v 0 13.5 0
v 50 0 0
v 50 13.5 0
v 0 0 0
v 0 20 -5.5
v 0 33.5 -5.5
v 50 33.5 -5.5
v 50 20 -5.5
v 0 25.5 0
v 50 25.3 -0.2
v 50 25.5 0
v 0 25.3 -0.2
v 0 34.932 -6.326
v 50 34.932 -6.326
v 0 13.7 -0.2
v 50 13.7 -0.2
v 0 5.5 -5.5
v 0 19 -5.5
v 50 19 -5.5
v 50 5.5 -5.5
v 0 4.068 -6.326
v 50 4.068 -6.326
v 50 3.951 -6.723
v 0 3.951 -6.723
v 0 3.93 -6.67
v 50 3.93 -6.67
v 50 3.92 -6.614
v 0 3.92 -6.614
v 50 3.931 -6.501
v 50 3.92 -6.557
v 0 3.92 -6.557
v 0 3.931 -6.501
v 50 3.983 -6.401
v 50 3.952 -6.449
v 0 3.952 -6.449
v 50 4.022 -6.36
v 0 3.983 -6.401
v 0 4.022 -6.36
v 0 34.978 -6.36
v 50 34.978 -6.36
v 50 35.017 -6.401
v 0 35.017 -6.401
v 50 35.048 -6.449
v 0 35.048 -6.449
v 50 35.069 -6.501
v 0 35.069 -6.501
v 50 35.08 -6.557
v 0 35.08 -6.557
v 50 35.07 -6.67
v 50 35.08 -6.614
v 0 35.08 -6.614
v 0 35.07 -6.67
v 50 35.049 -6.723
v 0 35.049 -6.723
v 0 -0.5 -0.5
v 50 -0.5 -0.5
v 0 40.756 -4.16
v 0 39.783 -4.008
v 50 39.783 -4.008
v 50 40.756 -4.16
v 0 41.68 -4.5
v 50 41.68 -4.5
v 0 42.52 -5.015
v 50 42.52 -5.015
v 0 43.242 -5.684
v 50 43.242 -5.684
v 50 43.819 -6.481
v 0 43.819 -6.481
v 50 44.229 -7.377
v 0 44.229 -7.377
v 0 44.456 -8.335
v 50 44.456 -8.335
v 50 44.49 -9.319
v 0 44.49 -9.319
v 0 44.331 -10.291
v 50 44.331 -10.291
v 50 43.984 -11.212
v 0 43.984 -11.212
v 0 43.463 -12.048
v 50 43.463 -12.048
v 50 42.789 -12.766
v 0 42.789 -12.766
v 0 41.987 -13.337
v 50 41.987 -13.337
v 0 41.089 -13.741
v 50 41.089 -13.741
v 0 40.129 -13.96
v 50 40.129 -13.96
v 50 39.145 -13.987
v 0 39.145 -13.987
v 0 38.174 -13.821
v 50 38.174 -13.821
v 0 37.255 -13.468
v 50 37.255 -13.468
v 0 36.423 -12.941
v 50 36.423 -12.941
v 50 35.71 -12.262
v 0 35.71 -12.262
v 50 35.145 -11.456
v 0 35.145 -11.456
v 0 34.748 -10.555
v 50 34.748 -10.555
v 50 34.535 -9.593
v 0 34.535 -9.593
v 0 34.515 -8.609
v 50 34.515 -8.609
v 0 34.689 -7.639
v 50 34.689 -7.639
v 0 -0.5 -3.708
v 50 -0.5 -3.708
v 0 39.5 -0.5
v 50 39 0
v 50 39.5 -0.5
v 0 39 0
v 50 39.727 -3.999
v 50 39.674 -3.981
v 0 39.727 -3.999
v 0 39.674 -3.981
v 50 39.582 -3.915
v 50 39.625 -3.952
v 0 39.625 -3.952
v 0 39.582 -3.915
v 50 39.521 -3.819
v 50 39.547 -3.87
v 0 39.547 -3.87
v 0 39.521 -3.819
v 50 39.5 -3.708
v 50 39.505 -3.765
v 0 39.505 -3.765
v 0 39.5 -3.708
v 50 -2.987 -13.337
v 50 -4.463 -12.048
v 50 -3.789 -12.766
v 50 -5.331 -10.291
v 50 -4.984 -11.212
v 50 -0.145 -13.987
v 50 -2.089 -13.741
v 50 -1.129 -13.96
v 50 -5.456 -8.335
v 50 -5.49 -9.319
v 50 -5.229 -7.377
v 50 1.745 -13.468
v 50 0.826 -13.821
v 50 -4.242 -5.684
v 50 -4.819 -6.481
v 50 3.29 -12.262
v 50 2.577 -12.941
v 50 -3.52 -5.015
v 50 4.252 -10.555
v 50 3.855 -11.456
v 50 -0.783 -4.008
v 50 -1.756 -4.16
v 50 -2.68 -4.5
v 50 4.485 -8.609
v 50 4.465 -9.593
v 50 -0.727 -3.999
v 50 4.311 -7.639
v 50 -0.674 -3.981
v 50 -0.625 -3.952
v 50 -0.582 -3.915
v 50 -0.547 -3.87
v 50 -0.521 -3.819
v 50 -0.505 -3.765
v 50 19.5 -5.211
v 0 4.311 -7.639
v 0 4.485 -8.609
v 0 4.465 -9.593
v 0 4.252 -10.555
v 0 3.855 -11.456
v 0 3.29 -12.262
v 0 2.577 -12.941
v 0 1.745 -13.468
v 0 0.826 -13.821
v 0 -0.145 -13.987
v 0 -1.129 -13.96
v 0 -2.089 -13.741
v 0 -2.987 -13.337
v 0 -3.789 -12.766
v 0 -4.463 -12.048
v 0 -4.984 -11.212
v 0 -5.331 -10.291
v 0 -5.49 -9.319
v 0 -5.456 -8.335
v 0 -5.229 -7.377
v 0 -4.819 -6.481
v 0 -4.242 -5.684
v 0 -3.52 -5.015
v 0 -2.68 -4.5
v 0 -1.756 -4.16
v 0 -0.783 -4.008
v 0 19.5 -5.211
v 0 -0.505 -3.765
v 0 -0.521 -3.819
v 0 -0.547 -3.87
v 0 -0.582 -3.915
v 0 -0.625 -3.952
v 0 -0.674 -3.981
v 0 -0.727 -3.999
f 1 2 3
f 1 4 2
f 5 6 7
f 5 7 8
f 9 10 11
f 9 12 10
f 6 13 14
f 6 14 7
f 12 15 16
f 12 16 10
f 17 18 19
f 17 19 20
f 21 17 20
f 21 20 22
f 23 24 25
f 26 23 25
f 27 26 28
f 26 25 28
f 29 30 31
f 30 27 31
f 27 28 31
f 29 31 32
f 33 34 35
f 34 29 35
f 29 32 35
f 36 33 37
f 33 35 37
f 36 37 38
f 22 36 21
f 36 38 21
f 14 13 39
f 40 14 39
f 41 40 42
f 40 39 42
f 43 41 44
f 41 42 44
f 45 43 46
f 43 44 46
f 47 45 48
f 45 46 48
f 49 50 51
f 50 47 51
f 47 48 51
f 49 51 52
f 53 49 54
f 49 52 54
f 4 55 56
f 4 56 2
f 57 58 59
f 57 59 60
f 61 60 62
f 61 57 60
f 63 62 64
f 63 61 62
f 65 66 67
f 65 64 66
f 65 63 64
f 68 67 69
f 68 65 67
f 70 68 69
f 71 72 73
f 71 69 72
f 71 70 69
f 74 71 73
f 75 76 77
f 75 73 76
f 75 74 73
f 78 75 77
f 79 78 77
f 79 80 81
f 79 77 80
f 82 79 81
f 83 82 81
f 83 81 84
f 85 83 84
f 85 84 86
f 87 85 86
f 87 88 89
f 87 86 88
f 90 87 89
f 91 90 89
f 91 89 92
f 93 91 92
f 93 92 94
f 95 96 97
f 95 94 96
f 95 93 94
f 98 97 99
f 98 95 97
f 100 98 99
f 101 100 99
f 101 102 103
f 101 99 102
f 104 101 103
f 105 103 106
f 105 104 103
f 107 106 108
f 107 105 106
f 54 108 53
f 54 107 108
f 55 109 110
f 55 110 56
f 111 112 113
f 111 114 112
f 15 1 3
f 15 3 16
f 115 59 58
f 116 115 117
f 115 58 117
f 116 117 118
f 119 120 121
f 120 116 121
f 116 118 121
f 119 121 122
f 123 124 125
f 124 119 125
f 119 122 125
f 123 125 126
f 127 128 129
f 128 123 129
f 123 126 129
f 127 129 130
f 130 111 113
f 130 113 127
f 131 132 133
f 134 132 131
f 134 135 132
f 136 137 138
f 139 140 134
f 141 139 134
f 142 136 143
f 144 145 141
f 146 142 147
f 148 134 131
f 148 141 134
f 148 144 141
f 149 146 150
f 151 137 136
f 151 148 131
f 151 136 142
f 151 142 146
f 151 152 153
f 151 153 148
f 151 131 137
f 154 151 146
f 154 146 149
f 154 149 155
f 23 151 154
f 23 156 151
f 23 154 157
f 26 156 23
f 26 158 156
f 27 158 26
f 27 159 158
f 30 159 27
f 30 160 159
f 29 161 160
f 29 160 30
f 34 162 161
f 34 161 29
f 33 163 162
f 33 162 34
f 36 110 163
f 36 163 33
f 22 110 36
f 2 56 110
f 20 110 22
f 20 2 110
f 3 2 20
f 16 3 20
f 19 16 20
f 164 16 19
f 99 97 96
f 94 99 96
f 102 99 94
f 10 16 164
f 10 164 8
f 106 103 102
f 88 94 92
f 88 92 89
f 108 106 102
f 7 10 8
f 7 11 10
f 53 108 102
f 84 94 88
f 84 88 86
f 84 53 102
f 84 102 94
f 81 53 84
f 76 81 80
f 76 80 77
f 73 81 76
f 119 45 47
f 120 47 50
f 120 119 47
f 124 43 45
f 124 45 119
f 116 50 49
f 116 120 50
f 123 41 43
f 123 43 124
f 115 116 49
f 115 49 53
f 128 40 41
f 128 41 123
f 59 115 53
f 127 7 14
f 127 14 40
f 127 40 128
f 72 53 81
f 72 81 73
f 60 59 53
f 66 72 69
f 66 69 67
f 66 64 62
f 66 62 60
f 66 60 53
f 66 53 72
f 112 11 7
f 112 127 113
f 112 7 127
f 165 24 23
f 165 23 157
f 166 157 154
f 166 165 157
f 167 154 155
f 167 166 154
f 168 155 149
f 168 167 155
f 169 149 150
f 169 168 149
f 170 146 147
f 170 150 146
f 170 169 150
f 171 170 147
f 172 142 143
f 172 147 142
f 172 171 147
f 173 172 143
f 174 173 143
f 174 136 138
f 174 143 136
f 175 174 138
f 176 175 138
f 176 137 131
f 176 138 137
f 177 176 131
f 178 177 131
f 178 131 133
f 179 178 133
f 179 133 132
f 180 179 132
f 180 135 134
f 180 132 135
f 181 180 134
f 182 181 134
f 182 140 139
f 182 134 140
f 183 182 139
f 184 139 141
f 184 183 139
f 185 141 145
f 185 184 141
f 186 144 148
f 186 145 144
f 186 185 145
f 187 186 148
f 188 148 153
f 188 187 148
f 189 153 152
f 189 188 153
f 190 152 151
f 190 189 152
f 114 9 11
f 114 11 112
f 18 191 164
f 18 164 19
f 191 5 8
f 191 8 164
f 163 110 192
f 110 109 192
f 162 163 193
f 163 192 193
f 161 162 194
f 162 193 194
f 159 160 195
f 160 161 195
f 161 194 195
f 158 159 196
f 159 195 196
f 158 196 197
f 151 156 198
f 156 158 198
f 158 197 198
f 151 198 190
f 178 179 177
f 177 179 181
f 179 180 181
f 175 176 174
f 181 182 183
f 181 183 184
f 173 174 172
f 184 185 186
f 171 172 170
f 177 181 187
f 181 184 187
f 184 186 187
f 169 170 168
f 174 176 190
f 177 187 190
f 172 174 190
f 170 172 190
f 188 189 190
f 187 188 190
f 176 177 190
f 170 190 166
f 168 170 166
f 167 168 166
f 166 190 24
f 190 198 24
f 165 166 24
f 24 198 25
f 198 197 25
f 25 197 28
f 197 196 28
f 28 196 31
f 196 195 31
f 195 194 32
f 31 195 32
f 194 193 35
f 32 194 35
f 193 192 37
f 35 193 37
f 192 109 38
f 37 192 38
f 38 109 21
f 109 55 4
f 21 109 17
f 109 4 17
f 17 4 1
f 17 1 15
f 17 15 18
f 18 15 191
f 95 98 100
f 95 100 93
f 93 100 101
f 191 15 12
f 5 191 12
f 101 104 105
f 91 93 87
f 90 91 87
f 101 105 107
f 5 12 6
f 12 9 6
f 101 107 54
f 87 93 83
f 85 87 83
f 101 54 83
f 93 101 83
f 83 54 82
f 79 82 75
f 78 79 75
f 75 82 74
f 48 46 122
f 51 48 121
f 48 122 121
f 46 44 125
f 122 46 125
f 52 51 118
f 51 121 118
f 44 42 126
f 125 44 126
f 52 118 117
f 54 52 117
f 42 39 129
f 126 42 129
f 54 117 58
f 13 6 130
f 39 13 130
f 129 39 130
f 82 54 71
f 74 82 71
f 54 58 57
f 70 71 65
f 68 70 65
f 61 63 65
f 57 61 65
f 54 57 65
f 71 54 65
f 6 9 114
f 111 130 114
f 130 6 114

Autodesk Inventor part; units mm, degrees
ref_plane "YZ Plane" through (0, 0, 0) normal (1, 0, 0) x (0, 1, 0)
ref_plane "XZ Plane" through (0, 0, 0) normal (0, 1, 0) x (-1, 0, 0)
ref_plane "XY Plane" through (0, 0, 0) normal (0, 0, 1) x (1, 0, 0)
sketch "Szkic1" plane through (0, 0, 0) normal (1, 0, 0) x (0, 1, 0)
  line L0 (13.7, -0.2) -> (25.3, -0.2)
  line L1 (13.5, 0) -> (13.7, -0.2)
  line L2 (0, 0) -> (13.5, 0)
  line L3 (-0.5, -0.5) -> (0, 0)
  line L4 (-0.5, -3.7085) -> (-0.5, -0.5)
  arc A0 (-0.783, -4.008) -> (-0.5, -3.7085) centre (-0.8, -3.7085) ccw
  arc A1 (-0.783, -4.008) -> (3.9514, -6.7229) centre (-0.5, -9) ccw
  arc A2 (4.0685, -6.3265) -> (3.9514, -6.7229) centre (4.2185, -6.5863) ccw
  line L5 (5.5, -5.5) -> (4.0685, -6.3265)
  line L6 (19, -5.5) -> (5.5, -5.5)
  line L7 (19.5, -5.2113) -> (19, -5.5)
  line L8 (20, -5.5) -> (19.5, -5.2113)
  line L9 (33.5, -5.5) -> (20, -5.5)
  line L10 (34.9315, -6.3265) -> (33.5, -5.5)
  arc A3 (35.0486, -6.7229) -> (34.9315, -6.3265) centre (34.7815, -6.5863) ccw
  arc A4 (35.0486, -6.7229) -> (39.783, -4.008) centre (39.5, -9) ccw
  arc A5 (39.5, -3.7085) -> (39.783, -4.008) centre (39.8, -3.7085) ccw
  line L11 (39.5, -0.5) -> (39.5, -3.7085)
  line L12 (39, 0) -> (39.5, -0.5)
  line L13 (25.5, 0) -> (39, 0)
  line L14 (25.3, -0.2) -> (25.5, 0)
  point P0 (19.5, 0)
extrude "Wyciągnięcie proste1" add sketch "Szkic1" along normal blind 50
properties part number "WS_10_40_custom_length"
